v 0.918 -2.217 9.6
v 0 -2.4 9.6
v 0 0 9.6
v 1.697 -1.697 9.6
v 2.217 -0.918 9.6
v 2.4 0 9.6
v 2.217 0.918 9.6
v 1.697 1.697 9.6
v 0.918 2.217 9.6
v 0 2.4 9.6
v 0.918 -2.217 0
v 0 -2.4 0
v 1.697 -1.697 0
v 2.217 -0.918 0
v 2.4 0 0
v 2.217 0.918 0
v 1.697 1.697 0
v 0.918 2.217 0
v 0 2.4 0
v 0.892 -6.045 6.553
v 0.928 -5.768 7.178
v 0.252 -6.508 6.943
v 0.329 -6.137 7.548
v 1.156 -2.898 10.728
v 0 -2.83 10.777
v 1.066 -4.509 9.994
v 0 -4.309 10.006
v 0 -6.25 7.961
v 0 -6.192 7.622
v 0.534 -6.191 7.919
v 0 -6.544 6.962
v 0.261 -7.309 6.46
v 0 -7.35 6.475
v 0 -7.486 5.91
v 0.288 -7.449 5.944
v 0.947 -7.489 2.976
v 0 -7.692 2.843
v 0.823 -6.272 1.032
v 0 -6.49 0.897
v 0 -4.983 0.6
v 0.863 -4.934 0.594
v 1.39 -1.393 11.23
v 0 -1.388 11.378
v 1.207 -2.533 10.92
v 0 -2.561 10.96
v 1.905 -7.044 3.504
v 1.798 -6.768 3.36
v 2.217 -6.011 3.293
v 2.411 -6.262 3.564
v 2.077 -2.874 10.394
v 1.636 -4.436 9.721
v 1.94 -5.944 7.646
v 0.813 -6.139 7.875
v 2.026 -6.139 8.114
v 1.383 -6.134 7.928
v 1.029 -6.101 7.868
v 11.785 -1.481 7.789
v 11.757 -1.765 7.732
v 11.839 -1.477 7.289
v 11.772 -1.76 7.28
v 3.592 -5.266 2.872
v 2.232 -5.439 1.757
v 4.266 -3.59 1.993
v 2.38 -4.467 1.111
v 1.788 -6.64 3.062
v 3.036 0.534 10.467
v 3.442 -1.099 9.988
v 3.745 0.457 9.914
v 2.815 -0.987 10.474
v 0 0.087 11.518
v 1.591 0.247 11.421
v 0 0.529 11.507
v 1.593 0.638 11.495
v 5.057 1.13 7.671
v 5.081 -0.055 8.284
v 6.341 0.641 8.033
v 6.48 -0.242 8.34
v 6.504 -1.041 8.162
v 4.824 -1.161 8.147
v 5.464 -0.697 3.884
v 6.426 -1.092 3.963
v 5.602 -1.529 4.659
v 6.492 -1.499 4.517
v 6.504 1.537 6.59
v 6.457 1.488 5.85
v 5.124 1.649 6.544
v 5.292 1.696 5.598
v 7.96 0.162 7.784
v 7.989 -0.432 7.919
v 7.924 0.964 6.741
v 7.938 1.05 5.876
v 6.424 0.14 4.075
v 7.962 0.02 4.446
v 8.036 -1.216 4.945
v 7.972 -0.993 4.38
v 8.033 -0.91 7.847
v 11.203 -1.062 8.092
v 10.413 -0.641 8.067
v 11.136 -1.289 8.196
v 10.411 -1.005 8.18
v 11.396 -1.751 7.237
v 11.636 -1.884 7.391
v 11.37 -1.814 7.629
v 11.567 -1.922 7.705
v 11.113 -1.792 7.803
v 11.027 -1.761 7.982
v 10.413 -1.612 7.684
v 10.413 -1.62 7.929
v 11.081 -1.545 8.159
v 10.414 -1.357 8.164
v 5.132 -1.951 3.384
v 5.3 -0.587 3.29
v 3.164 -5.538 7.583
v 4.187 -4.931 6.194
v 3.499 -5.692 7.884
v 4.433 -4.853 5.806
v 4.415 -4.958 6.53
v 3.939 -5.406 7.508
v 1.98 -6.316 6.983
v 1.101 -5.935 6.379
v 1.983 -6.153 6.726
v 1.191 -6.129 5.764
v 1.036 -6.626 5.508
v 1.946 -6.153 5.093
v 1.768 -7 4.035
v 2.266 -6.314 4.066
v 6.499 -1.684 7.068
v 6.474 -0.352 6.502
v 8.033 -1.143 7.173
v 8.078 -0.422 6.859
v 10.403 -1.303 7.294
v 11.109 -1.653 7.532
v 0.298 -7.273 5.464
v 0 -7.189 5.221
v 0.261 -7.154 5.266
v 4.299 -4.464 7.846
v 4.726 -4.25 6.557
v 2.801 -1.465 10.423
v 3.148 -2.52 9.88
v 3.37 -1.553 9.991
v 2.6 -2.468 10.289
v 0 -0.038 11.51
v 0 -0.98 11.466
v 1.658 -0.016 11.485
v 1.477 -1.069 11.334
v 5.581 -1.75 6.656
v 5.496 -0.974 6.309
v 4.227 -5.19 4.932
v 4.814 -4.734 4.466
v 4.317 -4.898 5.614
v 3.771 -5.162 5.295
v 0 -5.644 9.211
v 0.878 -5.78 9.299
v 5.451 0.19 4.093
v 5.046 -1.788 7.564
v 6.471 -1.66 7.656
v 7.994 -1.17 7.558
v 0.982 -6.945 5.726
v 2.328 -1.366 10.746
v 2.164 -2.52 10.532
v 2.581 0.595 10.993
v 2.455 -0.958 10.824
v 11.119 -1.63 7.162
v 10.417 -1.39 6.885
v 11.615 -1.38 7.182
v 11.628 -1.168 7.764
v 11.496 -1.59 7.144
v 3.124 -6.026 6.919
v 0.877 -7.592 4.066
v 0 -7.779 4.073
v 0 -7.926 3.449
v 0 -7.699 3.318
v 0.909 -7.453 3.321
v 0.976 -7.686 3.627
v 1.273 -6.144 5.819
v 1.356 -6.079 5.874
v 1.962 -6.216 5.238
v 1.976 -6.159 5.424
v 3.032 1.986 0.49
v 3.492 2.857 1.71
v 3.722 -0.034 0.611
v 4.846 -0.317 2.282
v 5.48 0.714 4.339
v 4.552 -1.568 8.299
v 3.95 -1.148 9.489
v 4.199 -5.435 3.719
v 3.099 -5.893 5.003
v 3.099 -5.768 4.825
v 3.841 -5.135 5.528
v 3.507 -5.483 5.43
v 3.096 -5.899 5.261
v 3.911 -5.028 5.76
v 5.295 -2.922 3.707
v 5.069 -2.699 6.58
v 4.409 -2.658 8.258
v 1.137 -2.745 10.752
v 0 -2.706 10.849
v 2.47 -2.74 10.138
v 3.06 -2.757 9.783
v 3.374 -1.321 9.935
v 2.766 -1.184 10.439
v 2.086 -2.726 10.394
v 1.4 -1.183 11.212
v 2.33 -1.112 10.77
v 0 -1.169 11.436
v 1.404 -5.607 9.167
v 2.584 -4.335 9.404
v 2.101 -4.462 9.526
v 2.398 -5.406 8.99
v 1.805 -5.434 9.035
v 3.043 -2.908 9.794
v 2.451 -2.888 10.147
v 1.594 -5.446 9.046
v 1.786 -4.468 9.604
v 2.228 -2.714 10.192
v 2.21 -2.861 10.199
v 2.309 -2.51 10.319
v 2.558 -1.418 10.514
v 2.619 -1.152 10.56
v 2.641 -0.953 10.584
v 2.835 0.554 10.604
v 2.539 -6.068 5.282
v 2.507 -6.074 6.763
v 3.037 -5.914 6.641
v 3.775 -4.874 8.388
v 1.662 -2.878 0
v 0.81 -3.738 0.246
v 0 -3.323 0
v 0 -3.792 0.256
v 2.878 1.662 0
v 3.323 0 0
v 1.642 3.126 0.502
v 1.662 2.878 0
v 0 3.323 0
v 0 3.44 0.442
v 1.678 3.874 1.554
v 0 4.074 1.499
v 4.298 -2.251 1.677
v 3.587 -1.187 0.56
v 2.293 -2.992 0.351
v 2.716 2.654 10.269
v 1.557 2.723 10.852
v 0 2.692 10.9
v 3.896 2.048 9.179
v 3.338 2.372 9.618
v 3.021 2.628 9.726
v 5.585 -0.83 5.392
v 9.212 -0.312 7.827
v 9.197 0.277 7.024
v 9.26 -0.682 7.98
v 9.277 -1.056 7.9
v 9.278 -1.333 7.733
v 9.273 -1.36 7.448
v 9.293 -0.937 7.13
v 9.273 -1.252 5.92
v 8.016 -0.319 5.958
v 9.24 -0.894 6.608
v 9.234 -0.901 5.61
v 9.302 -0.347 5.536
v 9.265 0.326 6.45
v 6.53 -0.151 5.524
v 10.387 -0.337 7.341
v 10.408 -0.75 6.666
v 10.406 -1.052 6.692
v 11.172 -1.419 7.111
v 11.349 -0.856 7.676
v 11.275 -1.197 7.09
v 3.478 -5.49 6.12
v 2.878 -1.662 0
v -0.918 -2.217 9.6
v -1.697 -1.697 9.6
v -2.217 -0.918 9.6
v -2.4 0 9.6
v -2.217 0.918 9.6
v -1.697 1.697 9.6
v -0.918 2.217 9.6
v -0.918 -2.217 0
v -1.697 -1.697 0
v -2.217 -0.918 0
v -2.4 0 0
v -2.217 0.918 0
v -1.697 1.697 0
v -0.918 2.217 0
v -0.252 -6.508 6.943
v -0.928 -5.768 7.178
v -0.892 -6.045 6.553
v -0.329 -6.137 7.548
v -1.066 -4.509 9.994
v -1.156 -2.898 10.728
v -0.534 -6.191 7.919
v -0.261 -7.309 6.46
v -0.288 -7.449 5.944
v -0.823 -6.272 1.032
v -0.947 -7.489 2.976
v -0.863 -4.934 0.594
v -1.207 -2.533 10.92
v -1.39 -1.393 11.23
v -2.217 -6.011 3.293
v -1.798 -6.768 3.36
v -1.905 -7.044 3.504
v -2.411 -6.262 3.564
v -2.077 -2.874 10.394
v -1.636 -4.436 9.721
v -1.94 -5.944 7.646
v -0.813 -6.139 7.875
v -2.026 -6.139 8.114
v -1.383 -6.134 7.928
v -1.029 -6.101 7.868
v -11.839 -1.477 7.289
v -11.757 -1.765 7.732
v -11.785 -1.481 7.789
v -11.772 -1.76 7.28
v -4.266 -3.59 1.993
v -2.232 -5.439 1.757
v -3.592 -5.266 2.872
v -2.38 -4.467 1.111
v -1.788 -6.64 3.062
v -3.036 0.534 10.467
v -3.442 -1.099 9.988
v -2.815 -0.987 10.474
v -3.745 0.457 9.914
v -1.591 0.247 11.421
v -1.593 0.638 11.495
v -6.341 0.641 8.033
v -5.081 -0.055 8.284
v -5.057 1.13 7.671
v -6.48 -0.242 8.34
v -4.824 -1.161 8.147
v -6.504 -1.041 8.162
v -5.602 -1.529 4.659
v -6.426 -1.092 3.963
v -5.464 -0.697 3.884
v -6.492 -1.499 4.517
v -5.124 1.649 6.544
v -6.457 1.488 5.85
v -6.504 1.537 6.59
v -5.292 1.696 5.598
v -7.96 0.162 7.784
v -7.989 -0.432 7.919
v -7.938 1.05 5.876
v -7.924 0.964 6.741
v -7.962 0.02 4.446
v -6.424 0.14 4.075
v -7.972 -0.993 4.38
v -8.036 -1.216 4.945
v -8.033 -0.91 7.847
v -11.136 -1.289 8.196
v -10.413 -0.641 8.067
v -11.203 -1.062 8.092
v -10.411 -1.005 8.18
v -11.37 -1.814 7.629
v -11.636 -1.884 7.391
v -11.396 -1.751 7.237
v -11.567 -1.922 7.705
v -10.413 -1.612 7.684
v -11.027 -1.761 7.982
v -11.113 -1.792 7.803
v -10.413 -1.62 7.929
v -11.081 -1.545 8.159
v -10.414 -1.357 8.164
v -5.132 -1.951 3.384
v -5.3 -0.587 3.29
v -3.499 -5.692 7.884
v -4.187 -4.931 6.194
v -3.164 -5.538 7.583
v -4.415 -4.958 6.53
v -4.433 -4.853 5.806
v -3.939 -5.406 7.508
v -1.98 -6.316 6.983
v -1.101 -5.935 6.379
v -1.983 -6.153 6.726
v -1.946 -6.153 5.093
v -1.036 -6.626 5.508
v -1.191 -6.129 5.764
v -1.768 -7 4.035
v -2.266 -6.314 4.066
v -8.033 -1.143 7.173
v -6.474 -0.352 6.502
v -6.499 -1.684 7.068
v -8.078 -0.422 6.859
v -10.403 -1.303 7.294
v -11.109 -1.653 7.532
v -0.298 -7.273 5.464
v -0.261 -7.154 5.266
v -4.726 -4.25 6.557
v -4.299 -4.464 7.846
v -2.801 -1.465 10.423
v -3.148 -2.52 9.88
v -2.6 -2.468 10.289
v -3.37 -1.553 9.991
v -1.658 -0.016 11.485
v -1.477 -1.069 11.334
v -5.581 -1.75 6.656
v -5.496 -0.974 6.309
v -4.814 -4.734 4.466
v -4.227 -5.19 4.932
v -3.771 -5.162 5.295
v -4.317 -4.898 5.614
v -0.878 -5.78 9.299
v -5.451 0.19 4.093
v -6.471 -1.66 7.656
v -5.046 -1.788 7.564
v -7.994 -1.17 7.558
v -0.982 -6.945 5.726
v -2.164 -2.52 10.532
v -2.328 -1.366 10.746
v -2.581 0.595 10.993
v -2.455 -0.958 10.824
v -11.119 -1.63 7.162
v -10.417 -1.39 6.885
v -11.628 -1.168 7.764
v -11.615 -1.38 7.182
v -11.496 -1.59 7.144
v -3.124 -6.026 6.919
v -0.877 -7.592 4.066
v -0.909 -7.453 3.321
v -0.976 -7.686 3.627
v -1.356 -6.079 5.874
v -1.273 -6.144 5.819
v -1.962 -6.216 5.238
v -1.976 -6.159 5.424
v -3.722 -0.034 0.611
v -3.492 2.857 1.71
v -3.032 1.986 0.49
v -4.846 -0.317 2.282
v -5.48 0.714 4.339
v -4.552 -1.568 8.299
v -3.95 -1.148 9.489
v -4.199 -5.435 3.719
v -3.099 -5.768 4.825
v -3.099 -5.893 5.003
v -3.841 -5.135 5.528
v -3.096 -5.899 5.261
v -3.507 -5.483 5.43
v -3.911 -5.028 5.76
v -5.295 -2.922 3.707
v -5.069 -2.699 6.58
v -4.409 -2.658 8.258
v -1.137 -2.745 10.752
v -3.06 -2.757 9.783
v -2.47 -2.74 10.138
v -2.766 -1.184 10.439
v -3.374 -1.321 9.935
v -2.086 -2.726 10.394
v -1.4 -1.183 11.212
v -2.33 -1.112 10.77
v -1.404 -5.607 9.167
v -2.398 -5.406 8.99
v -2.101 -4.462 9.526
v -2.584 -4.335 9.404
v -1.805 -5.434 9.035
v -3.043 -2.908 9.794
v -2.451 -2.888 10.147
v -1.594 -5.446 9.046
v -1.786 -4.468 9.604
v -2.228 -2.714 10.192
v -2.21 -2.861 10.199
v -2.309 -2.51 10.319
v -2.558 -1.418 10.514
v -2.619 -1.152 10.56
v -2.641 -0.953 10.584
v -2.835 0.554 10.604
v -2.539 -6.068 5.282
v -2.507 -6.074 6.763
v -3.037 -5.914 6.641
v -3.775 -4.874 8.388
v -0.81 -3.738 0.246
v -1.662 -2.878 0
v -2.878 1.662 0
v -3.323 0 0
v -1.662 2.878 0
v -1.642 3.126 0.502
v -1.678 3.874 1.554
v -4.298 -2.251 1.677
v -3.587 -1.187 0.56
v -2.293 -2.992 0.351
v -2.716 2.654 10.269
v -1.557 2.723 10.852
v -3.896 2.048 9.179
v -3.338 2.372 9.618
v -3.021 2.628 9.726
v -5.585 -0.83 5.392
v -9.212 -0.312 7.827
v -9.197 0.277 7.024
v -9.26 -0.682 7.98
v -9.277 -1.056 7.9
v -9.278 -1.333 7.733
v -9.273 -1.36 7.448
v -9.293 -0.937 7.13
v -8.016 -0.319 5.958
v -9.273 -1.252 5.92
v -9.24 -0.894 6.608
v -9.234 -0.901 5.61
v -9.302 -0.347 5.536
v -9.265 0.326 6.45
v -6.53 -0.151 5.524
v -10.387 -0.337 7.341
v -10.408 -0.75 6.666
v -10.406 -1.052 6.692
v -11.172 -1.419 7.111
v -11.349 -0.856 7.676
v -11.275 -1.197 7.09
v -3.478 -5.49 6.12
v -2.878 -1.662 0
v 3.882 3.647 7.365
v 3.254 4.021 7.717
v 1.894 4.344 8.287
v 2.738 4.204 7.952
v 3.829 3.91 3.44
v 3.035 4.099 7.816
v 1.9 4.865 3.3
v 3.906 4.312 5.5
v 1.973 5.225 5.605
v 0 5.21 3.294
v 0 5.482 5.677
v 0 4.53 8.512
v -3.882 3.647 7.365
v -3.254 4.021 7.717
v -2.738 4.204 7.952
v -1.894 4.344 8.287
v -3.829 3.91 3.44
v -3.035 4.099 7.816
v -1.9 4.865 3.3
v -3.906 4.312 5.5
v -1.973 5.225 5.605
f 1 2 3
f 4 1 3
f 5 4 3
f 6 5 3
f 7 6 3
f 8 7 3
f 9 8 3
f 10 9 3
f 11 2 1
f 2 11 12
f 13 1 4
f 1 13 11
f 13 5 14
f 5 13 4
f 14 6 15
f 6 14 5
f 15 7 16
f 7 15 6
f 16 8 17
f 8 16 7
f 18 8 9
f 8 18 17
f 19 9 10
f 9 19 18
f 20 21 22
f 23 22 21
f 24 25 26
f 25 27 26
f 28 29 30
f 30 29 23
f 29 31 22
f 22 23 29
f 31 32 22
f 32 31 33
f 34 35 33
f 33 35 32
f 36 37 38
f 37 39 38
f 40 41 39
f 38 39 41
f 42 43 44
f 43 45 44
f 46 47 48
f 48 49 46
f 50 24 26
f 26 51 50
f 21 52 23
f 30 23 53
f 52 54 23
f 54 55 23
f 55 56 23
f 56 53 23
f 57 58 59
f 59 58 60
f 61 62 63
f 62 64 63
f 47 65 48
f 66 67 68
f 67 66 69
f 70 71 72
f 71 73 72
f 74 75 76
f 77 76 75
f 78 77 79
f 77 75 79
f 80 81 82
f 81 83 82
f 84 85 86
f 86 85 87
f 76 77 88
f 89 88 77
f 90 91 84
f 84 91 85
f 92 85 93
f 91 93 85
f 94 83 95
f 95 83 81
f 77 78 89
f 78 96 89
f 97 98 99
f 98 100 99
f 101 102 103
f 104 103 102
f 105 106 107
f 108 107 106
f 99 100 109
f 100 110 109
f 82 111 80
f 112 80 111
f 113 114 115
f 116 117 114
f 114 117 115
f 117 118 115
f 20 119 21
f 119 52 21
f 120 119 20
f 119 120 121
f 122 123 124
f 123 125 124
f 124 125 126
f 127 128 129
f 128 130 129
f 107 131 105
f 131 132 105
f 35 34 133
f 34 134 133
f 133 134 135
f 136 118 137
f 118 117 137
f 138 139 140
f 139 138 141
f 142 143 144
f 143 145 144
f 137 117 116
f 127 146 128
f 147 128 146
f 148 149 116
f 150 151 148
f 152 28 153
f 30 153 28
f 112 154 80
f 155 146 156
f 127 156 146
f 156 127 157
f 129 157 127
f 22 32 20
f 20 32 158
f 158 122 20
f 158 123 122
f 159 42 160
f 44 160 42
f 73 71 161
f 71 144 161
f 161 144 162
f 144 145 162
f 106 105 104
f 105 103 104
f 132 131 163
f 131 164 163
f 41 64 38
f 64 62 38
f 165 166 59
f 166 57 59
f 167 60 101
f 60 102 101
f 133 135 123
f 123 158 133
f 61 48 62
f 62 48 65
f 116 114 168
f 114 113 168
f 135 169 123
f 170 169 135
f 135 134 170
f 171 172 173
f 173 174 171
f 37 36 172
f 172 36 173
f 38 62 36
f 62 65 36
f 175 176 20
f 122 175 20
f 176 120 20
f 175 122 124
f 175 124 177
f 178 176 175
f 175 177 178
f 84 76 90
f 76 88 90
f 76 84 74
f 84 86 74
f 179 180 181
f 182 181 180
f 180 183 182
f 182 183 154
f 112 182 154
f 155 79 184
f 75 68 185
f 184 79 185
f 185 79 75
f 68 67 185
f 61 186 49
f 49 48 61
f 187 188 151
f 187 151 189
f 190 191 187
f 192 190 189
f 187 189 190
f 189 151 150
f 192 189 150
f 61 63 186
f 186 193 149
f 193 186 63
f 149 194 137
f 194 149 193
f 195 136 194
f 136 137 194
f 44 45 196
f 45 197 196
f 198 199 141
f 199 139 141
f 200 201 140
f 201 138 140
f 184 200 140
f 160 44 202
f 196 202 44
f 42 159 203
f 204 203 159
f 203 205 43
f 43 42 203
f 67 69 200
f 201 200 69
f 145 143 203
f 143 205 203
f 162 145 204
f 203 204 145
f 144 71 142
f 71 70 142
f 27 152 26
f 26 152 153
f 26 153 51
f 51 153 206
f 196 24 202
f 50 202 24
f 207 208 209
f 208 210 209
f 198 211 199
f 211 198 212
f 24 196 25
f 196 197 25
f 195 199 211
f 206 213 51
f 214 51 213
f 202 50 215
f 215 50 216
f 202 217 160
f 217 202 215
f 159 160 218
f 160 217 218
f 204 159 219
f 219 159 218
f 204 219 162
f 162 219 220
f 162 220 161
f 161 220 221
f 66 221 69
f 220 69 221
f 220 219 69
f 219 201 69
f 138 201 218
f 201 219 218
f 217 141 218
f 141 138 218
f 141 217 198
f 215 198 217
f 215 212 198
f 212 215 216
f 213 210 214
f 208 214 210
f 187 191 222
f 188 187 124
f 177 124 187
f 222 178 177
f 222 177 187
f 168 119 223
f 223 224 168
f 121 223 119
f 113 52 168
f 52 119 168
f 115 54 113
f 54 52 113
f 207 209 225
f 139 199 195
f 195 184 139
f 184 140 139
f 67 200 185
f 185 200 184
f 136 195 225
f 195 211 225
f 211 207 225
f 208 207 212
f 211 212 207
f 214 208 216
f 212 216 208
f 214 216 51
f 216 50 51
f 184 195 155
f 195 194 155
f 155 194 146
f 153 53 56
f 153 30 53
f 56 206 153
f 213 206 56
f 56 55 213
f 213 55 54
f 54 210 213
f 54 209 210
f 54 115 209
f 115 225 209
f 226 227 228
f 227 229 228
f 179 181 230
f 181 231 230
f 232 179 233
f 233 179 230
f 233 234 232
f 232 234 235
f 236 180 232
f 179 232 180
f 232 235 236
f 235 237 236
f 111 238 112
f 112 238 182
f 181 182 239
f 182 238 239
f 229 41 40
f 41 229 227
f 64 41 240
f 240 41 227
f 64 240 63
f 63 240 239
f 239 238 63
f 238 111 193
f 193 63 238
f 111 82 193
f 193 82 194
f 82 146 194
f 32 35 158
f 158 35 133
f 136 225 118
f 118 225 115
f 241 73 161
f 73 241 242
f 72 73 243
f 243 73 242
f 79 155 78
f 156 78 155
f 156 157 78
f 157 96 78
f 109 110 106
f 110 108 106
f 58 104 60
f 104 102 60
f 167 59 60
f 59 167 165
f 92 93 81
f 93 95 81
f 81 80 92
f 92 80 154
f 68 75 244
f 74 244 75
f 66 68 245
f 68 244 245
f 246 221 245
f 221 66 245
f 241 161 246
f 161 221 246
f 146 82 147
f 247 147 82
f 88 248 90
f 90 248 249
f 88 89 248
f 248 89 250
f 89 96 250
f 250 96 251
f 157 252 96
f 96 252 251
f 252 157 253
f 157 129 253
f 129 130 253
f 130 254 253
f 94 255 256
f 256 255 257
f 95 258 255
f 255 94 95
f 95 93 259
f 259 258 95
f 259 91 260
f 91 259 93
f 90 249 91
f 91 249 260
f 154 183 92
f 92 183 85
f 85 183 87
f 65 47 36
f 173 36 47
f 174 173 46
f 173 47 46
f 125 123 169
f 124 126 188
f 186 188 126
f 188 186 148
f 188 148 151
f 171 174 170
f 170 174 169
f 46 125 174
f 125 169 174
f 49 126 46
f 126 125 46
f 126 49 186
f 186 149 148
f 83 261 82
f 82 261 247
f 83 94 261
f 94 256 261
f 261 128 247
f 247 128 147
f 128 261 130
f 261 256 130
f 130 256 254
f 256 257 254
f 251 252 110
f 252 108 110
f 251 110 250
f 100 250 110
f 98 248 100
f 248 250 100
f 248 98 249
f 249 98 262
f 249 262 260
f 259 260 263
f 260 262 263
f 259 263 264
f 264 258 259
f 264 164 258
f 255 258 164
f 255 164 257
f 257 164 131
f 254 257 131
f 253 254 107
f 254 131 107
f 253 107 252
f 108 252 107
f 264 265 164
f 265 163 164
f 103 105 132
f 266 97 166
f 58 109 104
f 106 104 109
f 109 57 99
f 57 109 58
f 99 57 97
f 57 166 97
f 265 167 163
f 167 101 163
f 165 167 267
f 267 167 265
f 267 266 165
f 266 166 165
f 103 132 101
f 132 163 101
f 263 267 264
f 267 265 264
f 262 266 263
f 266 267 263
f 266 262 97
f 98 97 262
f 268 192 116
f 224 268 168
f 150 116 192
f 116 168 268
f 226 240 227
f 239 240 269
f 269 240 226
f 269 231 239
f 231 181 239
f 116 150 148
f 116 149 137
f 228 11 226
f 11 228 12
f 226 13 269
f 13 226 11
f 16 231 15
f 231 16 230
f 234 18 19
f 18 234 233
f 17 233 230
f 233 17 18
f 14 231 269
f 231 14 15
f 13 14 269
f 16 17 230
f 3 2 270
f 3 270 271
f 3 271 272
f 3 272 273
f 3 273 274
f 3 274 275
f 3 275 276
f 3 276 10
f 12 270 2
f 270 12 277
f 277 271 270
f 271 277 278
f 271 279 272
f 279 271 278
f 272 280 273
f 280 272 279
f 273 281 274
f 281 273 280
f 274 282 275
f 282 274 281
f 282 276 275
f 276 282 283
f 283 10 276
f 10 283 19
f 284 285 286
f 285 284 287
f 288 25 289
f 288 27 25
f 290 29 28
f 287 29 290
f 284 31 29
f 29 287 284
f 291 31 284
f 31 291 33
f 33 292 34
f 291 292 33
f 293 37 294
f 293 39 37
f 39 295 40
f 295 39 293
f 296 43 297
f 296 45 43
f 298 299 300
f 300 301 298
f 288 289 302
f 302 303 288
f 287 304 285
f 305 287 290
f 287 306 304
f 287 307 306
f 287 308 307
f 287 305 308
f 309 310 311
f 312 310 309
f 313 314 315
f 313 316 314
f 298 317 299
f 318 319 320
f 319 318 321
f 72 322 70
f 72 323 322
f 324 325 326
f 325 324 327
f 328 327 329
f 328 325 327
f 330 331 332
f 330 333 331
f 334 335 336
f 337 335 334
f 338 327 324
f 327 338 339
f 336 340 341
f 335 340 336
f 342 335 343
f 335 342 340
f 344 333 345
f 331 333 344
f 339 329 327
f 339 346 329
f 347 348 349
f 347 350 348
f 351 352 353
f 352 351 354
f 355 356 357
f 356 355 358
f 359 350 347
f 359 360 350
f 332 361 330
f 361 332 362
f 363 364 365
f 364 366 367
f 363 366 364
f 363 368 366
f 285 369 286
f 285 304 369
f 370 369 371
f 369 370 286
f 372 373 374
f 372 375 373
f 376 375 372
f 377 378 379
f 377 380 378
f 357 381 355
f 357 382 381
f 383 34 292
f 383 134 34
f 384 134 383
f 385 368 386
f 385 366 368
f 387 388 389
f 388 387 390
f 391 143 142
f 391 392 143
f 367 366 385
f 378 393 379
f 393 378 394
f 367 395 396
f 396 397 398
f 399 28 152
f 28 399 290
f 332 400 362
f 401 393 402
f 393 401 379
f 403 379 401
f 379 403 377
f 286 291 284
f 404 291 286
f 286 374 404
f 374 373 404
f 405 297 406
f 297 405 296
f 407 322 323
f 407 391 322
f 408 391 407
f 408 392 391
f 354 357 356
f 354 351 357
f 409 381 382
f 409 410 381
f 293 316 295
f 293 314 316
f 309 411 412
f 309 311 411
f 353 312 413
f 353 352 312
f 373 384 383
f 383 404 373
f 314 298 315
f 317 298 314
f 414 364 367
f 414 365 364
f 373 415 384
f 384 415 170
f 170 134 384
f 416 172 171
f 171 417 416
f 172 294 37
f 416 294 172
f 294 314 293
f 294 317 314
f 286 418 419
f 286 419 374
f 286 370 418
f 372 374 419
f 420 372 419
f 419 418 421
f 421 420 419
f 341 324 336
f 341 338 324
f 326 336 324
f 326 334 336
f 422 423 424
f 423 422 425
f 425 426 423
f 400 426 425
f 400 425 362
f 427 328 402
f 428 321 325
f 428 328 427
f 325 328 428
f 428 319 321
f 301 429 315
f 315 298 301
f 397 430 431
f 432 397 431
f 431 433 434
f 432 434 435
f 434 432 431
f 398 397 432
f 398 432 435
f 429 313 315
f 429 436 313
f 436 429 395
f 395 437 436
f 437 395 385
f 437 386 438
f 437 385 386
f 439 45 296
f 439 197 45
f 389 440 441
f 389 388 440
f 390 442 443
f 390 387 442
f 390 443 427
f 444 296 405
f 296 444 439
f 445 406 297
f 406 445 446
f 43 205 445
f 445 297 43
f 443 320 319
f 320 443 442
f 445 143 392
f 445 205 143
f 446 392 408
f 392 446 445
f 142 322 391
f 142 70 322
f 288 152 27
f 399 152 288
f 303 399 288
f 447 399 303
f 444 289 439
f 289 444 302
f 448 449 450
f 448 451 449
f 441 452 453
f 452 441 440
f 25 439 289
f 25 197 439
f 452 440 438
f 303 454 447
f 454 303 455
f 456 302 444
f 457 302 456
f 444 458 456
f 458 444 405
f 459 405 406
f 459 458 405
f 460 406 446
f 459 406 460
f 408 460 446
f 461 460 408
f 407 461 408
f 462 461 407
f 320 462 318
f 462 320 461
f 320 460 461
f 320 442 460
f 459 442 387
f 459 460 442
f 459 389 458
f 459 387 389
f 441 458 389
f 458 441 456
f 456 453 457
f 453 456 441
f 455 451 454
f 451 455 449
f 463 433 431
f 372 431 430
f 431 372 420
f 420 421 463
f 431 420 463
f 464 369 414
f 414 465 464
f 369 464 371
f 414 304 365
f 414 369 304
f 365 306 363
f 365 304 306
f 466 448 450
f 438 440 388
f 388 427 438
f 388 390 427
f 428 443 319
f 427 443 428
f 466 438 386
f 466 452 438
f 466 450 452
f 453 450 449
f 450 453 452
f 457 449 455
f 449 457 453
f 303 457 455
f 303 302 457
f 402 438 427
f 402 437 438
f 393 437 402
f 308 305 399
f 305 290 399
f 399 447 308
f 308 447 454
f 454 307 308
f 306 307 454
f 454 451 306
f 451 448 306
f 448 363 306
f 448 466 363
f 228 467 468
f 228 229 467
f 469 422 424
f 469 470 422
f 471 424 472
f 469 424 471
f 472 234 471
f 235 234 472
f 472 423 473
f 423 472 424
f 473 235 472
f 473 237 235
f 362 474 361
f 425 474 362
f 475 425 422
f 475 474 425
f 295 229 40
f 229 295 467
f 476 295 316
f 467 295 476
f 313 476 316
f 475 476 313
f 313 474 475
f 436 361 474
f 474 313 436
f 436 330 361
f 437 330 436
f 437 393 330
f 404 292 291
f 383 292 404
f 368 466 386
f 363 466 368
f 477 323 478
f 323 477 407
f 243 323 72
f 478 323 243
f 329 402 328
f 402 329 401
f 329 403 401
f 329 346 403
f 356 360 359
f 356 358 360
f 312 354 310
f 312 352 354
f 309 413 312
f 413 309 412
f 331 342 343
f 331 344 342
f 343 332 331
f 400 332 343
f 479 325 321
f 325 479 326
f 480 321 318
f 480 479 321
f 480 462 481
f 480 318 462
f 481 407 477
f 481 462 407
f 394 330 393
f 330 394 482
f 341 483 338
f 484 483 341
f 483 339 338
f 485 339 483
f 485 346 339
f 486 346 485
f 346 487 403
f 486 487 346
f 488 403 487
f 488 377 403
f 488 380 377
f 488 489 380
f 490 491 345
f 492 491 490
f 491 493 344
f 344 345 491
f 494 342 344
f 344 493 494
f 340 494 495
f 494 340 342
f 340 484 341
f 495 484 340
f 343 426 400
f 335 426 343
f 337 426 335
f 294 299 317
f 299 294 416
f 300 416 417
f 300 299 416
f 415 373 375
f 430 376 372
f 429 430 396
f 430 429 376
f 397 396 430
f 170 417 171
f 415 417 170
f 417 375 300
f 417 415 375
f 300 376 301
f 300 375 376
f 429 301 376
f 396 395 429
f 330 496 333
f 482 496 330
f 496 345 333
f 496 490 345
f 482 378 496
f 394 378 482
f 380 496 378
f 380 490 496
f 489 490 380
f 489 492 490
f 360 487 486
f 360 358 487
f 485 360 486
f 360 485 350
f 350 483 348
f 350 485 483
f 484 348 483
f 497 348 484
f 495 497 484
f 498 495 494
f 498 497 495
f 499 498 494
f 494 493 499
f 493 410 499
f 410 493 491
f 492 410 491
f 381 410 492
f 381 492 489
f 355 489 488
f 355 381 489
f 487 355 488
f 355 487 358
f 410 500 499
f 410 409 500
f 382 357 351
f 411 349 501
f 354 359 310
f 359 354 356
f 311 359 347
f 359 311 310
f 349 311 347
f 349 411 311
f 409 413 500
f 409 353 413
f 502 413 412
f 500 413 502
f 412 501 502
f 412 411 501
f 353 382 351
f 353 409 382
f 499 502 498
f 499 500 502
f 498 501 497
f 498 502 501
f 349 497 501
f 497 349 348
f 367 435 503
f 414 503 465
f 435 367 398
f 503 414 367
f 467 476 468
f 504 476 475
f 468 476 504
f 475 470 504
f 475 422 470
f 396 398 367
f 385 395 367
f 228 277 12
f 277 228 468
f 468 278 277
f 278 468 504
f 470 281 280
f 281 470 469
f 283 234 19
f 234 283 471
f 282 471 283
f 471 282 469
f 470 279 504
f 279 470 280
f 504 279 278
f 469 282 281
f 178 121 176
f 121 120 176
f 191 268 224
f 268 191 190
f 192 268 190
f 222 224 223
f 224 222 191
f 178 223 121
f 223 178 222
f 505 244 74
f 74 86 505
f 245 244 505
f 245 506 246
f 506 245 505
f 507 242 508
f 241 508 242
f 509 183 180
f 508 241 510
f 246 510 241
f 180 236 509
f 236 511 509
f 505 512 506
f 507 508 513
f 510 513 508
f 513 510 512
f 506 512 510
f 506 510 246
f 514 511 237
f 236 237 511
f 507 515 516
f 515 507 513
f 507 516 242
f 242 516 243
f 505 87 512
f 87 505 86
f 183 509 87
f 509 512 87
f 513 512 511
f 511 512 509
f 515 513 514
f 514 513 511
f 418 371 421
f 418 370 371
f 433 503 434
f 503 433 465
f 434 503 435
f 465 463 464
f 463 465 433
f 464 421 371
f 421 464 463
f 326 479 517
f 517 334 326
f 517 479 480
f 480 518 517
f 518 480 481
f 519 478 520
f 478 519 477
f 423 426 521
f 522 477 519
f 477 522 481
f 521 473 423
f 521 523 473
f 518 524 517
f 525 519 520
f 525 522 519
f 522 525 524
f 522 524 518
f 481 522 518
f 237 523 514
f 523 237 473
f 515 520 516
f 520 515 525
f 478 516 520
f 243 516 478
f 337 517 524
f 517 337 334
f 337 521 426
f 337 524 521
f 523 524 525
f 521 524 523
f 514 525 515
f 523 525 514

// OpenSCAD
use <../lib.scad>
use <s/13195s01.scad>
use <s/13195s02.scad>
function ldraw_lib__13195() = [
// 0 Minifig Head Yoda with Curved Ears Type 2
// 0 Name: 13195.dat
// 0 Author: Philippe Hurbain [Philo]
// 0 !LDRAW_ORG Part UPDATE 2020-03
// 0 !LICENSE Licensed under CC BY 2.0 and CC BY 4.0 : see CAreadme.txt
// 
// 0 BFC CERTIFY CCW
  [0,"BFC","CERTIFY"],
  [0,"BFC","CCW"],
// 
// 0 !KEYWORDS Star Wars, SW
// 
// 0 !HISTORY 2013-08-30 {LEGO Digital Designer} Original part shape
// 0 !HISTORY 2019-10-01 [Philo] File preparation for LDraw Parts Tracker
// 0 !HISTORY 2020-12-29 [PTadmin] Official Update 2020-03
// 
// 
// 1 16 0 0 0 1 0 0 0 1 0 0 0 1 s\13195s01.dat
  [1,16,0,0,0,1,0,0,0,1,0,0,0,1, ldraw_lib__s__13195s01()],
// 1 16 0 0 0 -1 0 0 0 1 0 0 0 1 s\13195s01.dat
  [1,16,0,0,0,-1,0,0,0,1,0,0,0,1, ldraw_lib__s__13195s01()],
// 1 16 0 0 0 1 0 0 0 1 0 0 0 1 s\13195s02.dat
  [1,16,0,0,0,1,0,0,0,1,0,0,0,1, ldraw_lib__s__13195s02()],
// 1 16 0 0 0 -1 0 0 0 1 0 0 0 1 s\13195s02.dat
  [1,16,0,0,0,-1,0,0,0,1,0,0,0,1, ldraw_lib__s__13195s02()],
];
makepoly(ldraw_lib__13195(), line=0.2);
